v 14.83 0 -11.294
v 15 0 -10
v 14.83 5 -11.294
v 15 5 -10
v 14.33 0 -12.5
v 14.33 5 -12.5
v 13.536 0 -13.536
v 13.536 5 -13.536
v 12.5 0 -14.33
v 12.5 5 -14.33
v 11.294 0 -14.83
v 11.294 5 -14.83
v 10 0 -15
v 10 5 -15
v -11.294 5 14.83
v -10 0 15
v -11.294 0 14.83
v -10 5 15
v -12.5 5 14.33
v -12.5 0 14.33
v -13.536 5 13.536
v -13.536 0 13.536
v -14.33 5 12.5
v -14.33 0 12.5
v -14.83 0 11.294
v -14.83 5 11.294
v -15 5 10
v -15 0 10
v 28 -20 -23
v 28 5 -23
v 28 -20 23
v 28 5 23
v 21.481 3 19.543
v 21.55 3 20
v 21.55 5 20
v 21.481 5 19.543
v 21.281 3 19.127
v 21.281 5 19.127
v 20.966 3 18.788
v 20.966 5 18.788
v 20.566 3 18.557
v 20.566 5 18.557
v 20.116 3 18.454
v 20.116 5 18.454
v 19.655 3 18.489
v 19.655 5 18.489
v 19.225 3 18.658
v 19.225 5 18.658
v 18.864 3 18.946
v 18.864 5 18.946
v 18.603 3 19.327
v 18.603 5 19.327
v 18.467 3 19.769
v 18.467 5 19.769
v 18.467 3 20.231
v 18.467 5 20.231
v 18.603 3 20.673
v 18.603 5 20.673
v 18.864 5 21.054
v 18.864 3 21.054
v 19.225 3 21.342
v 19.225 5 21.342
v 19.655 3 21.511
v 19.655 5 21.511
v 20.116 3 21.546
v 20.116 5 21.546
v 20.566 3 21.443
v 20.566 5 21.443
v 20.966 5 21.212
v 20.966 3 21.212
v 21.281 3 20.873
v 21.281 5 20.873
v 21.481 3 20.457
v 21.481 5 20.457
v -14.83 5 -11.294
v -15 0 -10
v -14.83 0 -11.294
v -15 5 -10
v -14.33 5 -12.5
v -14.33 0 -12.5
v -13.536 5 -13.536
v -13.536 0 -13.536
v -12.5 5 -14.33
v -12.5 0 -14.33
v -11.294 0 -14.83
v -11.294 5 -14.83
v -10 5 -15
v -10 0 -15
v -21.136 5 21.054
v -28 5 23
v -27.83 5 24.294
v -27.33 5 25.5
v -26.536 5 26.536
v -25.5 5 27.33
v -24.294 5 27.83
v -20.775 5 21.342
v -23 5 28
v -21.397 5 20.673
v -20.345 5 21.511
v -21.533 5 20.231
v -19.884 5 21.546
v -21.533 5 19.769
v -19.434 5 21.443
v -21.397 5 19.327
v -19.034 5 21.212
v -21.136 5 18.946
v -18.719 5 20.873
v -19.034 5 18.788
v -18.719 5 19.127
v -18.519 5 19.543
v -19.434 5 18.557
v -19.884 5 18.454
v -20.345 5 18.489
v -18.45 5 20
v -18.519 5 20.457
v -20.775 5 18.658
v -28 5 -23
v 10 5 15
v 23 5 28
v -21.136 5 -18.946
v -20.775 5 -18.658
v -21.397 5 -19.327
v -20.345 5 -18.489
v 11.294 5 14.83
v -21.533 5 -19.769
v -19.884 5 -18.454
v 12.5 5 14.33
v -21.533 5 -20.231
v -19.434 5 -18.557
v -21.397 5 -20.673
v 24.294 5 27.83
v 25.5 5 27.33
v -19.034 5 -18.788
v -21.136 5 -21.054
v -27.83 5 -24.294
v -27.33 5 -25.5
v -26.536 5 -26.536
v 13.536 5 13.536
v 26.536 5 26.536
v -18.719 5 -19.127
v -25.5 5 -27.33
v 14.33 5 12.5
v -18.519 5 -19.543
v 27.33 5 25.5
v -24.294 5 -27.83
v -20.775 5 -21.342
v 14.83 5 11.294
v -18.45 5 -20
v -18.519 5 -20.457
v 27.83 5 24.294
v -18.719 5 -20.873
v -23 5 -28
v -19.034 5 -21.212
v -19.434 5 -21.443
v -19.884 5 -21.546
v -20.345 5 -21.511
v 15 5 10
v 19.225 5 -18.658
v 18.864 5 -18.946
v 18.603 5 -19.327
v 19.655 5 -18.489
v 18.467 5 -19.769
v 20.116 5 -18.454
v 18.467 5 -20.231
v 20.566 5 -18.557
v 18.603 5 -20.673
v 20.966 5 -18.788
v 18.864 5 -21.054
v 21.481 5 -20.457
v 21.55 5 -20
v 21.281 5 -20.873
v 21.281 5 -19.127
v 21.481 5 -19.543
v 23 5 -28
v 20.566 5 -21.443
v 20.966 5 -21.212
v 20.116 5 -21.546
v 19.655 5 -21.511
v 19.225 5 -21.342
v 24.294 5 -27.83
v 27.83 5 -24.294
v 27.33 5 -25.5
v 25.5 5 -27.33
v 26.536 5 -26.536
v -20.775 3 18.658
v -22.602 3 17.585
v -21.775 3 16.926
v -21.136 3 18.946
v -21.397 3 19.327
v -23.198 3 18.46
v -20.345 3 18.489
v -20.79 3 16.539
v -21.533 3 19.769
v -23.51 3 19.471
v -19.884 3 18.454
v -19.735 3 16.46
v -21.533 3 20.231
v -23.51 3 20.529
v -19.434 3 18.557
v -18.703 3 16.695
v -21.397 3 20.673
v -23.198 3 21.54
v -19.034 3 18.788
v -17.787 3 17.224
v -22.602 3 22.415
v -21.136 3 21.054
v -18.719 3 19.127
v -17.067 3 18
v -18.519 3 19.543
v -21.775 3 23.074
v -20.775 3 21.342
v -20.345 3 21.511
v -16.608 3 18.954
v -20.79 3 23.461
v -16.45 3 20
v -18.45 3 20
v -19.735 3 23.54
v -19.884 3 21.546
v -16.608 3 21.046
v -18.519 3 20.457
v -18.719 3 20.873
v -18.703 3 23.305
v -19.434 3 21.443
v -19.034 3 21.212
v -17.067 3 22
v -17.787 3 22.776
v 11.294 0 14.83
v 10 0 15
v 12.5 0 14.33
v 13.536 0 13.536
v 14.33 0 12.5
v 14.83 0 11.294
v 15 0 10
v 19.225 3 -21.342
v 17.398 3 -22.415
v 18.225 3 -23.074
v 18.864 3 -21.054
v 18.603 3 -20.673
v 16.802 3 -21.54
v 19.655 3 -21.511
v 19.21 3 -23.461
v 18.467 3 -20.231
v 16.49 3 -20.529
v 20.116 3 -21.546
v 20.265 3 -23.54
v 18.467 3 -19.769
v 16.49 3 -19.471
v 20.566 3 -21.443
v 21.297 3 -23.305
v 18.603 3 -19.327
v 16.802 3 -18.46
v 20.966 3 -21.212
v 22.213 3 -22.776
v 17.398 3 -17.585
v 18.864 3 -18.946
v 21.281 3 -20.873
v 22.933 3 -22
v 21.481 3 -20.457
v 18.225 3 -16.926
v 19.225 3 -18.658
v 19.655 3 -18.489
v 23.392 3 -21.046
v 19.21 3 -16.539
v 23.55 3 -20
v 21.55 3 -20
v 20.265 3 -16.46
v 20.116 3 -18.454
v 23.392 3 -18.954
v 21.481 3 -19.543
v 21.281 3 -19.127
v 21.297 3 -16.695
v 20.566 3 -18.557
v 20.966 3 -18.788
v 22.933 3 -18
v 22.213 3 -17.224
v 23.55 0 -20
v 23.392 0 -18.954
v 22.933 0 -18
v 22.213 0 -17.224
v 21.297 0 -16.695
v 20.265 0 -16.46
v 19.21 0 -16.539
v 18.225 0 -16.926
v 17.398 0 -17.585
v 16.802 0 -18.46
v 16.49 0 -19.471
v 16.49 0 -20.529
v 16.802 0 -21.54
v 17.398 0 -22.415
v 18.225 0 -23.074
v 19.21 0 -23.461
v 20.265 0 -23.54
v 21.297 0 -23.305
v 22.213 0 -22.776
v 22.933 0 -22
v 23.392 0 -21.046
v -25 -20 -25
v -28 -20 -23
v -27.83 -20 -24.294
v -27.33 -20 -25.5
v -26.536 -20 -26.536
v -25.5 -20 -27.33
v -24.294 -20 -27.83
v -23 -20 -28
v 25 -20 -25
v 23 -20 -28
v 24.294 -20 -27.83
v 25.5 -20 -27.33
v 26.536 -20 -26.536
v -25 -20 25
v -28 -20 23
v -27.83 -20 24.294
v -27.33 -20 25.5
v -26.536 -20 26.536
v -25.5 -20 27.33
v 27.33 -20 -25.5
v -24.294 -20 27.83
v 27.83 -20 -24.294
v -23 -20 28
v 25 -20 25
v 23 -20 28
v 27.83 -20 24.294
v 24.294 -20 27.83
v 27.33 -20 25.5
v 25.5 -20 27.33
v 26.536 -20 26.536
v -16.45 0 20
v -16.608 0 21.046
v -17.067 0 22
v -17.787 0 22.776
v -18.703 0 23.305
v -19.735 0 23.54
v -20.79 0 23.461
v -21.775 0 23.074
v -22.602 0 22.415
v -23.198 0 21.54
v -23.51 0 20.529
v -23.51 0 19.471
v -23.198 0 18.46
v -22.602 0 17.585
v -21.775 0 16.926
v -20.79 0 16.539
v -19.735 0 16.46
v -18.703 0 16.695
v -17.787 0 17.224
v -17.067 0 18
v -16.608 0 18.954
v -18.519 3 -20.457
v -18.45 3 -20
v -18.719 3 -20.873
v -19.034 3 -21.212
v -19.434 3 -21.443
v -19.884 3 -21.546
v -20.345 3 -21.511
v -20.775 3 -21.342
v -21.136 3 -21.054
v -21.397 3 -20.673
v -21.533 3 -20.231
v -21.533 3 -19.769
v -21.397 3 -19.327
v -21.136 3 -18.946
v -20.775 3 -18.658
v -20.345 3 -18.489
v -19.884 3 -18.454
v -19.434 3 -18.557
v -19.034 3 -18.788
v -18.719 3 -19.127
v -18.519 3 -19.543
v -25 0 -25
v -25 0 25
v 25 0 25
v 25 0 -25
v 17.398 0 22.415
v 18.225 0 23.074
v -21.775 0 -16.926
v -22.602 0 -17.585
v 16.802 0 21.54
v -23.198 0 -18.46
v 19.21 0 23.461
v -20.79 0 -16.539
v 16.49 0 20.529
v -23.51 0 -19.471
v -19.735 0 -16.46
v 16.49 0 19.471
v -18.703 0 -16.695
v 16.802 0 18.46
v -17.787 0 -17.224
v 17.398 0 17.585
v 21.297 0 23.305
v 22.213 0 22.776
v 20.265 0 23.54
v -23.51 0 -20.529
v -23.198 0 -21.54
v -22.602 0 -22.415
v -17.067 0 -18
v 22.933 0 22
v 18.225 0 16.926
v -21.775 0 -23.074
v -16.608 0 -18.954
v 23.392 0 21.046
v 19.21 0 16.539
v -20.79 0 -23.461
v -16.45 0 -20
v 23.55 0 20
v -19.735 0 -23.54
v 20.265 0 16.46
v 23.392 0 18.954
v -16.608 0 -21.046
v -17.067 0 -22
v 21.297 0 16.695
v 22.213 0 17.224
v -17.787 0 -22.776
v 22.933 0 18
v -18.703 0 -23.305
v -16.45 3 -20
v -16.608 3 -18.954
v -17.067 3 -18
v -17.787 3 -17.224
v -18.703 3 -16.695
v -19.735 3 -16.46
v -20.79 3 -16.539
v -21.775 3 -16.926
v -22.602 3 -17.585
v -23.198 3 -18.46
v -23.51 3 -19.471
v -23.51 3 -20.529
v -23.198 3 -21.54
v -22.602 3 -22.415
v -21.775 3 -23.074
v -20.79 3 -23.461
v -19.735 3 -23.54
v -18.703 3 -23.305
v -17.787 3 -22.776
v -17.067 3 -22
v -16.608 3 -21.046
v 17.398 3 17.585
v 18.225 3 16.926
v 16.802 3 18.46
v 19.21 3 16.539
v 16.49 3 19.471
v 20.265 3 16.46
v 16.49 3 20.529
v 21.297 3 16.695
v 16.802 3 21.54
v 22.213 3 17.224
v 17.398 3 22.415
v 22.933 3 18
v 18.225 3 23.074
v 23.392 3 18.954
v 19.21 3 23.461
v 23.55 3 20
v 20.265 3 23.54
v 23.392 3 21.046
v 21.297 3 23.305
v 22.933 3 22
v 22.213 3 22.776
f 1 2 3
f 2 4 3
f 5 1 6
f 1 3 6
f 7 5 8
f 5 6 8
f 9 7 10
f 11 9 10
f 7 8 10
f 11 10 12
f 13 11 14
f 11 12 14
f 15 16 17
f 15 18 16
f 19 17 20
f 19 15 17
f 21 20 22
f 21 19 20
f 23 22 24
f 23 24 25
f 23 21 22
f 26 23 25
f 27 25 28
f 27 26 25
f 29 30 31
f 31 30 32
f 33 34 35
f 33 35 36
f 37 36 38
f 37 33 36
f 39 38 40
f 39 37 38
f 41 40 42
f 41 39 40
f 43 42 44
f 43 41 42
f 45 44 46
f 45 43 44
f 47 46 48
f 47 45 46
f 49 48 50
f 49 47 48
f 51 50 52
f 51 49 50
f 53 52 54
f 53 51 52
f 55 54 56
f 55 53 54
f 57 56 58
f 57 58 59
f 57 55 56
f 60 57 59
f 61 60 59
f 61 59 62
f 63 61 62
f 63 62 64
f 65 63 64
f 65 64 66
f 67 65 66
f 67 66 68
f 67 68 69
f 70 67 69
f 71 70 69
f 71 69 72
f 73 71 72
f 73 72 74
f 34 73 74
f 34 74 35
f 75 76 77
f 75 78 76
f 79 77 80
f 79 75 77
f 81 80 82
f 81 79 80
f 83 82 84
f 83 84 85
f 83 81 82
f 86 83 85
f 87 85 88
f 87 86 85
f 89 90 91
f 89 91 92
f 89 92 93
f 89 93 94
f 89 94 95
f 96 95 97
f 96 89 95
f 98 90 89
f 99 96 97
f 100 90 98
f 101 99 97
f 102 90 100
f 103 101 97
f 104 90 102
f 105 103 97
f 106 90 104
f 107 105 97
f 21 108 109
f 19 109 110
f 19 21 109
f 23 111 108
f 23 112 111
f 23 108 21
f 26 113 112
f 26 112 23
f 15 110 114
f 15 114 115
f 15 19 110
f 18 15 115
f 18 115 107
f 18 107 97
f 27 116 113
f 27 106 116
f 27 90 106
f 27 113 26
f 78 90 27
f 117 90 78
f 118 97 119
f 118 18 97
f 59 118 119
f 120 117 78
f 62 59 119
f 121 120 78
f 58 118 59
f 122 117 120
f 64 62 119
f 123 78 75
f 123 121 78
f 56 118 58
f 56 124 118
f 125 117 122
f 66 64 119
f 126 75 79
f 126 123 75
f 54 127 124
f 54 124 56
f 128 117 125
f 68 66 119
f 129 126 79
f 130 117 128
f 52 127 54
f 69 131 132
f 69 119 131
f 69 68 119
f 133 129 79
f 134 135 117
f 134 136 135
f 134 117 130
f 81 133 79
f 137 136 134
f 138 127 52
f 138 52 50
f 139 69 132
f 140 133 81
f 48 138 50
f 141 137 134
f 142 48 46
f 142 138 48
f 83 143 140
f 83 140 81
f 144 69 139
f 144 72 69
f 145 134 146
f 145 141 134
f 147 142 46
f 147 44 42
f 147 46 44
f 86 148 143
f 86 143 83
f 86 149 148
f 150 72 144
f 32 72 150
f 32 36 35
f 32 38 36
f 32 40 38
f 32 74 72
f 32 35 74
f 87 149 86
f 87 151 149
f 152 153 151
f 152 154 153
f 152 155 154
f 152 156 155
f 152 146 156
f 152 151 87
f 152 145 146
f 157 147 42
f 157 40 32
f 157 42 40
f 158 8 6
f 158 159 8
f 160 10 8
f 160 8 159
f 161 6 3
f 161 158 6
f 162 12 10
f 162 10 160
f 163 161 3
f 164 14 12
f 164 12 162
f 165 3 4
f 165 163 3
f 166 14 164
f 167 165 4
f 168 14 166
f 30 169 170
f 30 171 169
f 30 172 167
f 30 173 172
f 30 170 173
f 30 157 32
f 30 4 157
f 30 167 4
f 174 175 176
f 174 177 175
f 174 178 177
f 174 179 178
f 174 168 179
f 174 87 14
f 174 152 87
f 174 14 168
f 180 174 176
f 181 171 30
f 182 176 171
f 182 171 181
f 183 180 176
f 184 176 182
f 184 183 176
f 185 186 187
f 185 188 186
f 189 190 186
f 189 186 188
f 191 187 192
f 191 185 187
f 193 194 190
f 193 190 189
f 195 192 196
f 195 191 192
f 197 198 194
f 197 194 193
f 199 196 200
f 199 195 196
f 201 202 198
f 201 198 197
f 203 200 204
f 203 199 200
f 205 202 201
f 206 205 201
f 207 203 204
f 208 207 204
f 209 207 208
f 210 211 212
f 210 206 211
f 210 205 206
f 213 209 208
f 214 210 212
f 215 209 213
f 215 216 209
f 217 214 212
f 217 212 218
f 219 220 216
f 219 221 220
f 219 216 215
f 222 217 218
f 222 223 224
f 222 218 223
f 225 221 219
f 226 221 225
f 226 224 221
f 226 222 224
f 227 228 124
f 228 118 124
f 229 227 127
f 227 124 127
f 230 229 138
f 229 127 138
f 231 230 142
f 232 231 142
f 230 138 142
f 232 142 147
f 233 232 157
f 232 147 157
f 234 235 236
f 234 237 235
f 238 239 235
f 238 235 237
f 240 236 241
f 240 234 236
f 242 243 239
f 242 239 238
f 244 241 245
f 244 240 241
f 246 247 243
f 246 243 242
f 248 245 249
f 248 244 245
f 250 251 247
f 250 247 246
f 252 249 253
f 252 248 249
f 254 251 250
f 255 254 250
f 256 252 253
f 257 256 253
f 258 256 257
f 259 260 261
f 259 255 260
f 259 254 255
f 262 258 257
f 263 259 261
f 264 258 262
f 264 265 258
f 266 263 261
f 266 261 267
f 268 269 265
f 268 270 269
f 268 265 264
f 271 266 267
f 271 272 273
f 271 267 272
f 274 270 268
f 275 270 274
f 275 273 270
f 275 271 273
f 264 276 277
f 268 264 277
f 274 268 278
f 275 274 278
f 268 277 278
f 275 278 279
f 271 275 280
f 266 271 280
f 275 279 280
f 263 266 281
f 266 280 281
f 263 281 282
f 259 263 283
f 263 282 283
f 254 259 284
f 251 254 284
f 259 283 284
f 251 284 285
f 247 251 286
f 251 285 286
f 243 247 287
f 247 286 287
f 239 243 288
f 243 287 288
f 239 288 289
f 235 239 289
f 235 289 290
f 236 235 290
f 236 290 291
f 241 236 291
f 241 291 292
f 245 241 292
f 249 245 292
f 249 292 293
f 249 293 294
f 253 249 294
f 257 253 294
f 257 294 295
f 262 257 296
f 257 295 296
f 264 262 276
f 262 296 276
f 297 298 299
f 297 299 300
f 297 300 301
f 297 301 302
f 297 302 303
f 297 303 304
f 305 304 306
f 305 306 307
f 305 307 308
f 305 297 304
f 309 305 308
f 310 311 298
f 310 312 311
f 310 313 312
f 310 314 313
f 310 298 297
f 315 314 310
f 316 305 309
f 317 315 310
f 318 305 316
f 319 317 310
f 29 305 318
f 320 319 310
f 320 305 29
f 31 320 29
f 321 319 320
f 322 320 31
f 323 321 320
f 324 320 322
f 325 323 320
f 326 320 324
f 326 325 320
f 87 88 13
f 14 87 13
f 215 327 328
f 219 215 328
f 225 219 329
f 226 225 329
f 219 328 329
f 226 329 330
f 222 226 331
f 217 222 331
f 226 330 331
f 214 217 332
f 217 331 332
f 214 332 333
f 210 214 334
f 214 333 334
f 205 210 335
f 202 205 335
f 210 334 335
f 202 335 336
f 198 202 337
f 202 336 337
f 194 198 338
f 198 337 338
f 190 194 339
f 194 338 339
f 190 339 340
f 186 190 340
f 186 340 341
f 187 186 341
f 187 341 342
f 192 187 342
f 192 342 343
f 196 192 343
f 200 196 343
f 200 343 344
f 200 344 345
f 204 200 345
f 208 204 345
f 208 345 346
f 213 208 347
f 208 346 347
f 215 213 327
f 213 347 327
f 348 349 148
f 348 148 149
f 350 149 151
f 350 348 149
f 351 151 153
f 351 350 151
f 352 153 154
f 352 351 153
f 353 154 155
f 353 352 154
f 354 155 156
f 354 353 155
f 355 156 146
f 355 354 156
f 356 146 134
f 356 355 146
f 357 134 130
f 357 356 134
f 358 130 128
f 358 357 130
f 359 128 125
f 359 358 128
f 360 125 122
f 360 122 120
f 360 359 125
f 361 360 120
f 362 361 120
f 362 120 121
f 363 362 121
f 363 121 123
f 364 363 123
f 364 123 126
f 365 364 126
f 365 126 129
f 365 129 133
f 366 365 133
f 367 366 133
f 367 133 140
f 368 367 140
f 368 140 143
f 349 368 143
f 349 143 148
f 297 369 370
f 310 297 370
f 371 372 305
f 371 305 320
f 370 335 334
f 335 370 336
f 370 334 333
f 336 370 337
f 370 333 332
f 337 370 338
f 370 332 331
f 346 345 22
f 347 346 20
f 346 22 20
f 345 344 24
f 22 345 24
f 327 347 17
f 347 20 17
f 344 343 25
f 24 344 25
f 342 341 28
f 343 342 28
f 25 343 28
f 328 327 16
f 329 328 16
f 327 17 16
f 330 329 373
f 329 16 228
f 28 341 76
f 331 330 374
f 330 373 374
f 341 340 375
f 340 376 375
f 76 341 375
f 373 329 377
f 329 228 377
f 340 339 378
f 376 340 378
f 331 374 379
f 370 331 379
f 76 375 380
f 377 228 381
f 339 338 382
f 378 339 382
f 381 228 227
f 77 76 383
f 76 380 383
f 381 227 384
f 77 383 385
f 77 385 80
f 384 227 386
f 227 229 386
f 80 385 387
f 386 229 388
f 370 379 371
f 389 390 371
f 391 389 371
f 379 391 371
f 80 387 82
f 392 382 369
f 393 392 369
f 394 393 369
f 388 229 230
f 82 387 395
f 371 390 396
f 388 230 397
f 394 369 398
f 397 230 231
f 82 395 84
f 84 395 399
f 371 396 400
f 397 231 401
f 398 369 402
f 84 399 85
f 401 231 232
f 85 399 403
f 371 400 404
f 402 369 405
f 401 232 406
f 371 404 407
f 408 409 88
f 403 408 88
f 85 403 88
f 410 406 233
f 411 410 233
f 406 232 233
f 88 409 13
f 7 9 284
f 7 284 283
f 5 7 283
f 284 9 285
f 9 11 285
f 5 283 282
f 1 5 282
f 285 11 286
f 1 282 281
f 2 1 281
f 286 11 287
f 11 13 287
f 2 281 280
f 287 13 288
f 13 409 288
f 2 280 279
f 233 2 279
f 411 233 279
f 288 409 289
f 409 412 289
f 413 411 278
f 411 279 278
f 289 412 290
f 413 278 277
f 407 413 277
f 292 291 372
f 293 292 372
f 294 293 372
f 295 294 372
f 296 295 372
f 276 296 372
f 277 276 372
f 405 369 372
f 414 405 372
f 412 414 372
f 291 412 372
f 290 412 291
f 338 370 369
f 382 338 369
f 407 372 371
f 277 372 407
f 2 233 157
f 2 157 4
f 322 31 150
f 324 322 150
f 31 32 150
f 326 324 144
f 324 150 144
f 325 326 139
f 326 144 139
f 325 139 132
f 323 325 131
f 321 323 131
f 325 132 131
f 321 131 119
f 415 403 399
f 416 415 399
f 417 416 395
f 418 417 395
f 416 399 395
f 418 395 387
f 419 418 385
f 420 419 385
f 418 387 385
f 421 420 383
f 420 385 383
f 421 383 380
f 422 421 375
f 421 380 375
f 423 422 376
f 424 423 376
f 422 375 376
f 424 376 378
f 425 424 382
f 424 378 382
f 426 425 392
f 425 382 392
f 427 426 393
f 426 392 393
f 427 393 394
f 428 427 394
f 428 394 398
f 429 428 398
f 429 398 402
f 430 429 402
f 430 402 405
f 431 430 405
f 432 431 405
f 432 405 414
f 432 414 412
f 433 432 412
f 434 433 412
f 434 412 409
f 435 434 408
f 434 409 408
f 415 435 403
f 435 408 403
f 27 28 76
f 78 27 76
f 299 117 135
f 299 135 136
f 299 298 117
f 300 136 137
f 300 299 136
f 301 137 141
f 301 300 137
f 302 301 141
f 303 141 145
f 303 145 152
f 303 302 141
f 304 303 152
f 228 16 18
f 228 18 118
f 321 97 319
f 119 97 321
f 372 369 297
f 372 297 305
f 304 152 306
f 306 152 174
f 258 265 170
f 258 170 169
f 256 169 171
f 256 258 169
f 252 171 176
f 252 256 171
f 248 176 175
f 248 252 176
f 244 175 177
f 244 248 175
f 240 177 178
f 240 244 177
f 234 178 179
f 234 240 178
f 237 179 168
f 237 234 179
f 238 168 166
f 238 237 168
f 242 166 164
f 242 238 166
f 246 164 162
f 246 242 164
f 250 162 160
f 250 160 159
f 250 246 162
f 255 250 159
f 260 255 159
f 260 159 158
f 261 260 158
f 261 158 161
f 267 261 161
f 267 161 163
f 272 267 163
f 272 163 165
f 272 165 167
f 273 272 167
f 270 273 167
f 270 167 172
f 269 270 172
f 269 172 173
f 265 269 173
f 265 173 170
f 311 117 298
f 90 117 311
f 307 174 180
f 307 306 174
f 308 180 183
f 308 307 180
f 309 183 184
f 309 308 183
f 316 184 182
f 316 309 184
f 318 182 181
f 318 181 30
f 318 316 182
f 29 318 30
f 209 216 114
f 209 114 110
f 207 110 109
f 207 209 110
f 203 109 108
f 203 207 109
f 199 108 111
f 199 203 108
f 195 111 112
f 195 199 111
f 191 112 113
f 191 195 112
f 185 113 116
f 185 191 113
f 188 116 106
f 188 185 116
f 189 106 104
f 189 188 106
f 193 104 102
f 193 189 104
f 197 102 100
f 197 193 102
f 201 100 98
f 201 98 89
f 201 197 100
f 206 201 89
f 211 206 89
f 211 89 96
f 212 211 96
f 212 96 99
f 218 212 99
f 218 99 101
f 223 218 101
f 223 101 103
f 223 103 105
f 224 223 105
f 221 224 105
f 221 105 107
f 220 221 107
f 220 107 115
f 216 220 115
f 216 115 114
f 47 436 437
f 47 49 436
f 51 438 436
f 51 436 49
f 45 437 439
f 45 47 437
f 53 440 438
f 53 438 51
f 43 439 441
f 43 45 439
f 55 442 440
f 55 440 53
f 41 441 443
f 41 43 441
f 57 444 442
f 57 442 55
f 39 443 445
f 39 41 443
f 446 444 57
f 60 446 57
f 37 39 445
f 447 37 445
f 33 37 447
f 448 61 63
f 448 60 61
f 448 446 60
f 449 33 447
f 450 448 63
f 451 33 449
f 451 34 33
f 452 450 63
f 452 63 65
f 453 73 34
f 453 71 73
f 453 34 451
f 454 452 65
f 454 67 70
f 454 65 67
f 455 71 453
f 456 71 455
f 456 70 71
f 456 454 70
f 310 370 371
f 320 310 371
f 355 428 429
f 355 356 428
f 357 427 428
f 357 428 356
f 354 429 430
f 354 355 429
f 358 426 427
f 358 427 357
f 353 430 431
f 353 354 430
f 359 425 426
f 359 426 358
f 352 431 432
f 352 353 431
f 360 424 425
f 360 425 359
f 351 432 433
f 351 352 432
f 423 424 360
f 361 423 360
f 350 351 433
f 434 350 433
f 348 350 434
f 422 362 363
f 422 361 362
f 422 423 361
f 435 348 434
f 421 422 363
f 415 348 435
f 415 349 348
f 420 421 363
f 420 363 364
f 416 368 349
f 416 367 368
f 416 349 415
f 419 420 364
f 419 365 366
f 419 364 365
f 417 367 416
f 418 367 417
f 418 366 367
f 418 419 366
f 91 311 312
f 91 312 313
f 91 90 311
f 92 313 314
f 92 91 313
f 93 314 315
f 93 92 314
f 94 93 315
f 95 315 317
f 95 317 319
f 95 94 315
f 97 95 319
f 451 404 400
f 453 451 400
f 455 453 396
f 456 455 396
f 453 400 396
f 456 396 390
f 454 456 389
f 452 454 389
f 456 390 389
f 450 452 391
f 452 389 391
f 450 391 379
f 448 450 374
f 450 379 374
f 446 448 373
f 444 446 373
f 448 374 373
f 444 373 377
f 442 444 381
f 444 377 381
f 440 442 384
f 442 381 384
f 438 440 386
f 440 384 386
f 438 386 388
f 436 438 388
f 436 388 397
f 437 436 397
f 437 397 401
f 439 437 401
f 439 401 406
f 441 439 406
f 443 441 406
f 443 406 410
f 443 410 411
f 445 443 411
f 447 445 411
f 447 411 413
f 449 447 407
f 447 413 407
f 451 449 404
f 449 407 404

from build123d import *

# Parameters (mm, degrees)
SKETCH1_W           = 56
SKETCH1_H           = 56
SKETCH1_R           = 1.55
SKETCH1_W_2         = 30
SKETCH1_H_2         = 30
BOSS_EXTRUDE1_DEPTH = 5
SKETCH2_R           = 3.55
CUT_EXTRUDE1_DEPTH  = 3
FILLET1_R           = 5
SKETCH3_W           = 56
SKETCH3_H           = 56
SKETCH3_W_2         = 50
SKETCH3_H_2         = 50
BOSS_EXTRUDE2_DEPTH = 20
FILLET2_R           = 5


with BuildPart() as part:
    # Sketch1 → Boss-Extrude1 (new body)
    with BuildSketch(Plane(origin=(0, 0, 0), x_dir=(1, 0, 0), z_dir=(0, 1, 0))):
        Rectangle(SKETCH1_W, SKETCH1_H)
        with Locations((-20, 20)):
            Circle(SKETCH1_R, mode=Mode.SUBTRACT)
        with Locations((20, 20)):
            Circle(SKETCH1_R, mode=Mode.SUBTRACT)
        with Locations((20, -20)):
            Circle(SKETCH1_R, mode=Mode.SUBTRACT)
        with Locations((-20, -20)):
            Circle(SKETCH1_R, mode=Mode.SUBTRACT)
        Rectangle(SKETCH1_W_2, SKETCH1_H_2, mode=Mode.SUBTRACT)
    extrude(amount=BOSS_EXTRUDE1_DEPTH)

    # Sketch2 → Cut-Extrude1 (cut)
    with BuildSketch(Plane.XZ):
        with Locations((-20, 20)):
            Circle(SKETCH2_R)
        with Locations((20, 20)):
            Circle(SKETCH2_R)
        with Locations((-20, -20)):
            Circle(SKETCH2_R)
        with Locations((20, -20)):
            Circle(SKETCH2_R)
    extrude(amount=-CUT_EXTRUDE1_DEPTH, mode=Mode.SUBTRACT)

    # Fillet1
    fillet1_edges = [part.edges().sort_by_distance(p)[0] for p in [
        (15, 2.5, 15),
        (15, 2.5, -15),
        (-15, 2.5, -15),
        (-15, 2.5, 15),
    ]]
    fillet(fillet1_edges, radius=FILLET1_R)

    # Sketch3 → Boss-Extrude2 (add)
    with BuildSketch(Plane.XZ):
        Rectangle(SKETCH3_W, SKETCH3_H)
        Rectangle(SKETCH3_W_2, SKETCH3_H_2, mode=Mode.SUBTRACT)
    extrude(amount=BOSS_EXTRUDE2_DEPTH)

    # Fillet2
    fillet2_edges = [part.edges().sort_by_distance(p)[0] for p in [
        (-28, -7.5, -28),
        (28, -7.5, -28),
        (28, -7.5, 28),
        (-28, -7.5, 28),
    ]]
    fillet(fillet2_edges, radius=FILLET2_R)


solid = part.part
